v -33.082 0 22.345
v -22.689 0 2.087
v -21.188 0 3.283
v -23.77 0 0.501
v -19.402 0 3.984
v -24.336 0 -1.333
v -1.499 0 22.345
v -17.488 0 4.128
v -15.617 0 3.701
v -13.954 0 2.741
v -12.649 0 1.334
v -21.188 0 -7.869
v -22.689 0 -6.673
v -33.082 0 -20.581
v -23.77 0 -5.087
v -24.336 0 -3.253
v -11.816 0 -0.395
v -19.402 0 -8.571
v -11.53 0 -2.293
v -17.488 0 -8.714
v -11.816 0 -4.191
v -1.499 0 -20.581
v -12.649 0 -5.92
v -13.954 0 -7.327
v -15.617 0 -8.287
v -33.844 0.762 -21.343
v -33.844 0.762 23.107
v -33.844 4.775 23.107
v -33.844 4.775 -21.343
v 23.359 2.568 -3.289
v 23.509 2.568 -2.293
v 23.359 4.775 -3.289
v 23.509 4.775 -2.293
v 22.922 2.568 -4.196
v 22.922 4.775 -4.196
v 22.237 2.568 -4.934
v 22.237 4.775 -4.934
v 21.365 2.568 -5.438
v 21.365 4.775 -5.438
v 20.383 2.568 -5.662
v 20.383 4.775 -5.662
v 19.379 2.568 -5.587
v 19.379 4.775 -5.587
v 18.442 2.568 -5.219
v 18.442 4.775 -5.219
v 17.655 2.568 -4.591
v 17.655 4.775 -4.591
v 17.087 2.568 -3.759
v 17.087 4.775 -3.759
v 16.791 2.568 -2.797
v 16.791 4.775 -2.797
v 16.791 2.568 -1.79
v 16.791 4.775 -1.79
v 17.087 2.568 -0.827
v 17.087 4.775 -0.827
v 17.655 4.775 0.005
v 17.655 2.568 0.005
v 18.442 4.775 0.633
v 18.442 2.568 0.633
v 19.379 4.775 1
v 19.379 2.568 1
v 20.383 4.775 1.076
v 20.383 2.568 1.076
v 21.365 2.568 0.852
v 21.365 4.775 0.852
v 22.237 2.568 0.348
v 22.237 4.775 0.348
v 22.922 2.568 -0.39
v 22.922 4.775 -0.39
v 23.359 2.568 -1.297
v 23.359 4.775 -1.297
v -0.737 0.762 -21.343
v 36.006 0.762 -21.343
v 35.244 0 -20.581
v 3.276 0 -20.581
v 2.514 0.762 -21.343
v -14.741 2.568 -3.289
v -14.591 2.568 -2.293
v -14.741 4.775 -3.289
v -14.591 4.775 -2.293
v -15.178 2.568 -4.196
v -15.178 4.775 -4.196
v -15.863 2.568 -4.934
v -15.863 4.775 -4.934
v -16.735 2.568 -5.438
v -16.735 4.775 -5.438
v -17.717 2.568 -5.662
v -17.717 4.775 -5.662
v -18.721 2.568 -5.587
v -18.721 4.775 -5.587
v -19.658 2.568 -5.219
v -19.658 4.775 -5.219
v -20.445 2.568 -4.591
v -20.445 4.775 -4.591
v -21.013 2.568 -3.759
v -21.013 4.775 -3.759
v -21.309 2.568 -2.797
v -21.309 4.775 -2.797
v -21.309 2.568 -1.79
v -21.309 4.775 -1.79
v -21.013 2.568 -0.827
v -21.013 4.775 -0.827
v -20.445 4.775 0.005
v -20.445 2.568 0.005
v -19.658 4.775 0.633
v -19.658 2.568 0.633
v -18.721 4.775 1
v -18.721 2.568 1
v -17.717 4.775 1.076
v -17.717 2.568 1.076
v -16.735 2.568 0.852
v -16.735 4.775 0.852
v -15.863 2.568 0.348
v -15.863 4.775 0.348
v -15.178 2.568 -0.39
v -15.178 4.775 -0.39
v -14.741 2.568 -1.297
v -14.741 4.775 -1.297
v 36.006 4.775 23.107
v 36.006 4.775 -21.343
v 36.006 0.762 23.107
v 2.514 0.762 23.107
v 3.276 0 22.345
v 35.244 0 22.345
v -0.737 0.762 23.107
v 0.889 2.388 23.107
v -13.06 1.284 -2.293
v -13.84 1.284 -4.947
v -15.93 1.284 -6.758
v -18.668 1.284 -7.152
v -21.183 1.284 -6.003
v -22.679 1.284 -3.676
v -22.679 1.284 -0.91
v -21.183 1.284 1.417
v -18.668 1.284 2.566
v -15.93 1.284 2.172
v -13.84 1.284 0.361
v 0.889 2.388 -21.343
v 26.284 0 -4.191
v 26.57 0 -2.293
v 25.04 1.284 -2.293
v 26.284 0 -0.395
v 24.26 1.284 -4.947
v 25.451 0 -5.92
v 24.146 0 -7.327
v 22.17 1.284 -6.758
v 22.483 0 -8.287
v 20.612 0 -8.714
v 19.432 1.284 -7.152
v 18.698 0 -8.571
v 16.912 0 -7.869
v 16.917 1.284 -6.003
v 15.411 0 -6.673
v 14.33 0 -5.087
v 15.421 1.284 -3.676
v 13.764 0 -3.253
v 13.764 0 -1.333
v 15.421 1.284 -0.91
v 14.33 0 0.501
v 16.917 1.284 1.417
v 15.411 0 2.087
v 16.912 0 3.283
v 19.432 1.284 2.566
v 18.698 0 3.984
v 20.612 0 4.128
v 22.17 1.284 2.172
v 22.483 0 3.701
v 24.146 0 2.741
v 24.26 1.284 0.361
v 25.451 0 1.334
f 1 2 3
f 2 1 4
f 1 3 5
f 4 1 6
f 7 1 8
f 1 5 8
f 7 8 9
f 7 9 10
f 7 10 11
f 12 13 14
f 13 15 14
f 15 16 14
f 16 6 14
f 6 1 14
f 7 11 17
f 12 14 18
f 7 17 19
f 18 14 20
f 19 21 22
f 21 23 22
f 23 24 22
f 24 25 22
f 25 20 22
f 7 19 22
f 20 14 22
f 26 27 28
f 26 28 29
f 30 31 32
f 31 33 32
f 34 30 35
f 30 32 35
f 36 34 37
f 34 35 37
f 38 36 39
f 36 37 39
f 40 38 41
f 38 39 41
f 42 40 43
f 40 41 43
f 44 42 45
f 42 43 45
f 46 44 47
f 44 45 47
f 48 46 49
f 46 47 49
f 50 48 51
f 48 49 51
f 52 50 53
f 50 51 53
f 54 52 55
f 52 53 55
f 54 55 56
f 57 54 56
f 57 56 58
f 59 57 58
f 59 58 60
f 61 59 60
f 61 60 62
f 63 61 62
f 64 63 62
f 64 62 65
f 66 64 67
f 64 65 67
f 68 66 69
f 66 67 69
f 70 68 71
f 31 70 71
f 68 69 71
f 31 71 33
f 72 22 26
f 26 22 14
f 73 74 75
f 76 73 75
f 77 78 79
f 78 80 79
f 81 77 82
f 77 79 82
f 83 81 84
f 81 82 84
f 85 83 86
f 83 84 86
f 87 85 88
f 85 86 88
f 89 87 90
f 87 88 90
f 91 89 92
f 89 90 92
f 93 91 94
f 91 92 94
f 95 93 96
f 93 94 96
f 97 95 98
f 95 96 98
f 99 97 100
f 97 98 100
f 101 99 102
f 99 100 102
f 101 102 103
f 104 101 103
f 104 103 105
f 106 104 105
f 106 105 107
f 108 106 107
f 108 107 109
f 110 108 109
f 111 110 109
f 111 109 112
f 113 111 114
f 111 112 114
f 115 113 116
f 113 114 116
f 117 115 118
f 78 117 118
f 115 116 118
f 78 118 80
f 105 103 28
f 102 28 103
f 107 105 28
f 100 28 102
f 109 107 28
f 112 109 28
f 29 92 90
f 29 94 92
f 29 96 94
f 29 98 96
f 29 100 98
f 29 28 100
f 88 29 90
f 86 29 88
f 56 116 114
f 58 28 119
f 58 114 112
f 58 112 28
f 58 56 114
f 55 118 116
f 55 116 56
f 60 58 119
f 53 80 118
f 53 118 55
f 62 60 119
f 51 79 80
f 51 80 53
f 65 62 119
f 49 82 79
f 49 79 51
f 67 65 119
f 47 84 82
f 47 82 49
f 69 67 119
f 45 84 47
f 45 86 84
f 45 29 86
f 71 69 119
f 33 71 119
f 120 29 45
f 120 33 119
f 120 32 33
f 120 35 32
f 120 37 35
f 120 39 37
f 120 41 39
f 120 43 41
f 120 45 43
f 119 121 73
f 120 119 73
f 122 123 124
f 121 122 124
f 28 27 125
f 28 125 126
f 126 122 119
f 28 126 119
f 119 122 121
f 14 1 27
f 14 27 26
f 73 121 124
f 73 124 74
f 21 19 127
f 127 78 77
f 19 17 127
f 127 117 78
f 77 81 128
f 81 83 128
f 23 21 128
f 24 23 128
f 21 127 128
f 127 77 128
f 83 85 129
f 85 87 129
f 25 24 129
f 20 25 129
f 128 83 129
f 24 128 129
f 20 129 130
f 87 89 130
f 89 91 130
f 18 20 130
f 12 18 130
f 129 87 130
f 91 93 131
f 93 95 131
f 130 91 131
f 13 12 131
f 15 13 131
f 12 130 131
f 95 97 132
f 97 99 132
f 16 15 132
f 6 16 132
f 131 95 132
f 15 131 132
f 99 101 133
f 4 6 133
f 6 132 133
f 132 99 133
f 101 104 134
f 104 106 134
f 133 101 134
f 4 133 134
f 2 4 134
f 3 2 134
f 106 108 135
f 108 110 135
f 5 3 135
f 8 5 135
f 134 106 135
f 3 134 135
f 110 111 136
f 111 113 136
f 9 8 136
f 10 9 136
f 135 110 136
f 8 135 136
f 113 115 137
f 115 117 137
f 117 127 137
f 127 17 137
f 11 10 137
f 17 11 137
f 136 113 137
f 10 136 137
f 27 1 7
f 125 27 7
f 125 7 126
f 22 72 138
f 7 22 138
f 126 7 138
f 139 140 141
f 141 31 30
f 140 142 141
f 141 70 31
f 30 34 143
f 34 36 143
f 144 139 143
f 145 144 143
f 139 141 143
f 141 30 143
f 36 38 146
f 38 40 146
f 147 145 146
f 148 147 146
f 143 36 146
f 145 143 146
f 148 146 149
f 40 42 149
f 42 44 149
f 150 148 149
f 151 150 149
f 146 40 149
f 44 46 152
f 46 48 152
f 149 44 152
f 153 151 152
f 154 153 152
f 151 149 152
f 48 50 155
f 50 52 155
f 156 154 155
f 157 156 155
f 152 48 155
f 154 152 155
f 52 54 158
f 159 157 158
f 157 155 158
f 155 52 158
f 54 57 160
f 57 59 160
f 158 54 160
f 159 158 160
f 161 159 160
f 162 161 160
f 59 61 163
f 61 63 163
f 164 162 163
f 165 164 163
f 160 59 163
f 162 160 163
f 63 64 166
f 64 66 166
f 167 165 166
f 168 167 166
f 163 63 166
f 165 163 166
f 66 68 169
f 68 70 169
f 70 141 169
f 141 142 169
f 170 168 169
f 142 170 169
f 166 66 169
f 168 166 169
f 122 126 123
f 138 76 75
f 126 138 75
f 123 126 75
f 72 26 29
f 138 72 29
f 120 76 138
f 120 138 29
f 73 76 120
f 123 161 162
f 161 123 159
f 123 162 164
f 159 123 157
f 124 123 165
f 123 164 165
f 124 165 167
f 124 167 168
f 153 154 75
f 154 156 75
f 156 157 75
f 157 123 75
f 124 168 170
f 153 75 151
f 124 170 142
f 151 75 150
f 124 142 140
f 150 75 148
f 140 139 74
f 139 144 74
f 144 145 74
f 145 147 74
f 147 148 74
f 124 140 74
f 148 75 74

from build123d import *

# Parameters (mm, degrees)
SKETCH2_W                                           = 69.85
SKETCH2_H                                           = 44.45
BOSS_EXTRUDE1_DEPTH                                 = 4.7752
CUT_EXTRUDE1_DEPTH                                  = 1
CUT_EXTRUDE1_DEPTH_BACK                             = 45.45
CHAMFER1_SIZE                                       = 0.762
CSK_FOR_1_4_FLAT_HEAD_MACHINE_SCREW_100_D           = 6.7564
CSK_FOR_1_4_FLAT_HEAD_MACHINE_SCREW_100_DEPTH       = 4.826
CSK_FOR_1_4_FLAT_HEAD_MACHINE_SCREW_100_CSINK_D     = 12.8778
CSK_FOR_1_4_FLAT_HEAD_MACHINE_SCREW_100_CSINK_ANGLE = 100
CSK_FOR_1_4_FLAT_HEAD_MACHINE_SCREW_100_TIP         = 2.029827343


with BuildPart() as part:
    # Sketch2 → Boss-Extrude1 (new body)
    with BuildSketch(Plane(origin=(0, 0, 0), x_dir=(1, 0, 0), z_dir=(0, 1, 0))):
        with Locations((1.080982686, -0.881944444)):
            Rectangle(SKETCH2_W, SKETCH2_H)
    extrude(amount=BOSS_EXTRUDE1_DEPTH)

    # Sketch3 → Cut-Extrude1 (cut, two sides)
    with BuildSketch(Plane(origin=(0, 0, -21.343055556), x_dir=(-1, 0, 0), z_dir=(0, 0, -1))) as cut_extrude1_sk:
        Polygon((-0.888710757, 2.3876), (-3.463824269, -0.187513512), (1.686402756, -0.187513512), align=None)
    extrude(amount=CUT_EXTRUDE1_DEPTH, mode=Mode.SUBTRACT)
    extrude(cut_extrude1_sk.sketch, amount=-CUT_EXTRUDE1_DEPTH_BACK, mode=Mode.SUBTRACT)

    # Chamfer1
    chamfer1_edges = [part.edges().sort_by_distance(p)[0] for p in [
        (-17.671453278, 0, -21.343055556),
        (19.641146722, 0, 23.106944444),
        (19.641146722, 0, -21.343055556),
        (36.005982686, 0, 0.881944444),
        (-17.671453278, 0, 23.106944444),
        (-33.844017314, 0, 0.881944444),
    ]]
    chamfer(chamfer1_edges, length=CHAMFER1_SIZE)

    # CSK for 1/4 Flat Head Machine Screw (100)1
    with Locations(Plane(origin=(0, 0, 0), x_dir=(-1, 0, 0), z_dir=(0, -1, 0))):
        with Locations((-20.130982686, 2.293055556), (17.969017314, 2.293055556)):
            CounterSinkHole(CSK_FOR_1_4_FLAT_HEAD_MACHINE_SCREW_100_D / 2, CSK_FOR_1_4_FLAT_HEAD_MACHINE_SCREW_100_CSINK_D / 2, depth=CSK_FOR_1_4_FLAT_HEAD_MACHINE_SCREW_100_DEPTH, counter_sink_angle=CSK_FOR_1_4_FLAT_HEAD_MACHINE_SCREW_100_CSINK_ANGLE)
            with Locations((0, 0, -(CSK_FOR_1_4_FLAT_HEAD_MACHINE_SCREW_100_DEPTH + CSK_FOR_1_4_FLAT_HEAD_MACHINE_SCREW_100_TIP / 2))):  # 118° drill point
                Cone(0, CSK_FOR_1_4_FLAT_HEAD_MACHINE_SCREW_100_D / 2, CSK_FOR_1_4_FLAT_HEAD_MACHINE_SCREW_100_TIP, mode=Mode.SUBTRACT)


solid = part.part
